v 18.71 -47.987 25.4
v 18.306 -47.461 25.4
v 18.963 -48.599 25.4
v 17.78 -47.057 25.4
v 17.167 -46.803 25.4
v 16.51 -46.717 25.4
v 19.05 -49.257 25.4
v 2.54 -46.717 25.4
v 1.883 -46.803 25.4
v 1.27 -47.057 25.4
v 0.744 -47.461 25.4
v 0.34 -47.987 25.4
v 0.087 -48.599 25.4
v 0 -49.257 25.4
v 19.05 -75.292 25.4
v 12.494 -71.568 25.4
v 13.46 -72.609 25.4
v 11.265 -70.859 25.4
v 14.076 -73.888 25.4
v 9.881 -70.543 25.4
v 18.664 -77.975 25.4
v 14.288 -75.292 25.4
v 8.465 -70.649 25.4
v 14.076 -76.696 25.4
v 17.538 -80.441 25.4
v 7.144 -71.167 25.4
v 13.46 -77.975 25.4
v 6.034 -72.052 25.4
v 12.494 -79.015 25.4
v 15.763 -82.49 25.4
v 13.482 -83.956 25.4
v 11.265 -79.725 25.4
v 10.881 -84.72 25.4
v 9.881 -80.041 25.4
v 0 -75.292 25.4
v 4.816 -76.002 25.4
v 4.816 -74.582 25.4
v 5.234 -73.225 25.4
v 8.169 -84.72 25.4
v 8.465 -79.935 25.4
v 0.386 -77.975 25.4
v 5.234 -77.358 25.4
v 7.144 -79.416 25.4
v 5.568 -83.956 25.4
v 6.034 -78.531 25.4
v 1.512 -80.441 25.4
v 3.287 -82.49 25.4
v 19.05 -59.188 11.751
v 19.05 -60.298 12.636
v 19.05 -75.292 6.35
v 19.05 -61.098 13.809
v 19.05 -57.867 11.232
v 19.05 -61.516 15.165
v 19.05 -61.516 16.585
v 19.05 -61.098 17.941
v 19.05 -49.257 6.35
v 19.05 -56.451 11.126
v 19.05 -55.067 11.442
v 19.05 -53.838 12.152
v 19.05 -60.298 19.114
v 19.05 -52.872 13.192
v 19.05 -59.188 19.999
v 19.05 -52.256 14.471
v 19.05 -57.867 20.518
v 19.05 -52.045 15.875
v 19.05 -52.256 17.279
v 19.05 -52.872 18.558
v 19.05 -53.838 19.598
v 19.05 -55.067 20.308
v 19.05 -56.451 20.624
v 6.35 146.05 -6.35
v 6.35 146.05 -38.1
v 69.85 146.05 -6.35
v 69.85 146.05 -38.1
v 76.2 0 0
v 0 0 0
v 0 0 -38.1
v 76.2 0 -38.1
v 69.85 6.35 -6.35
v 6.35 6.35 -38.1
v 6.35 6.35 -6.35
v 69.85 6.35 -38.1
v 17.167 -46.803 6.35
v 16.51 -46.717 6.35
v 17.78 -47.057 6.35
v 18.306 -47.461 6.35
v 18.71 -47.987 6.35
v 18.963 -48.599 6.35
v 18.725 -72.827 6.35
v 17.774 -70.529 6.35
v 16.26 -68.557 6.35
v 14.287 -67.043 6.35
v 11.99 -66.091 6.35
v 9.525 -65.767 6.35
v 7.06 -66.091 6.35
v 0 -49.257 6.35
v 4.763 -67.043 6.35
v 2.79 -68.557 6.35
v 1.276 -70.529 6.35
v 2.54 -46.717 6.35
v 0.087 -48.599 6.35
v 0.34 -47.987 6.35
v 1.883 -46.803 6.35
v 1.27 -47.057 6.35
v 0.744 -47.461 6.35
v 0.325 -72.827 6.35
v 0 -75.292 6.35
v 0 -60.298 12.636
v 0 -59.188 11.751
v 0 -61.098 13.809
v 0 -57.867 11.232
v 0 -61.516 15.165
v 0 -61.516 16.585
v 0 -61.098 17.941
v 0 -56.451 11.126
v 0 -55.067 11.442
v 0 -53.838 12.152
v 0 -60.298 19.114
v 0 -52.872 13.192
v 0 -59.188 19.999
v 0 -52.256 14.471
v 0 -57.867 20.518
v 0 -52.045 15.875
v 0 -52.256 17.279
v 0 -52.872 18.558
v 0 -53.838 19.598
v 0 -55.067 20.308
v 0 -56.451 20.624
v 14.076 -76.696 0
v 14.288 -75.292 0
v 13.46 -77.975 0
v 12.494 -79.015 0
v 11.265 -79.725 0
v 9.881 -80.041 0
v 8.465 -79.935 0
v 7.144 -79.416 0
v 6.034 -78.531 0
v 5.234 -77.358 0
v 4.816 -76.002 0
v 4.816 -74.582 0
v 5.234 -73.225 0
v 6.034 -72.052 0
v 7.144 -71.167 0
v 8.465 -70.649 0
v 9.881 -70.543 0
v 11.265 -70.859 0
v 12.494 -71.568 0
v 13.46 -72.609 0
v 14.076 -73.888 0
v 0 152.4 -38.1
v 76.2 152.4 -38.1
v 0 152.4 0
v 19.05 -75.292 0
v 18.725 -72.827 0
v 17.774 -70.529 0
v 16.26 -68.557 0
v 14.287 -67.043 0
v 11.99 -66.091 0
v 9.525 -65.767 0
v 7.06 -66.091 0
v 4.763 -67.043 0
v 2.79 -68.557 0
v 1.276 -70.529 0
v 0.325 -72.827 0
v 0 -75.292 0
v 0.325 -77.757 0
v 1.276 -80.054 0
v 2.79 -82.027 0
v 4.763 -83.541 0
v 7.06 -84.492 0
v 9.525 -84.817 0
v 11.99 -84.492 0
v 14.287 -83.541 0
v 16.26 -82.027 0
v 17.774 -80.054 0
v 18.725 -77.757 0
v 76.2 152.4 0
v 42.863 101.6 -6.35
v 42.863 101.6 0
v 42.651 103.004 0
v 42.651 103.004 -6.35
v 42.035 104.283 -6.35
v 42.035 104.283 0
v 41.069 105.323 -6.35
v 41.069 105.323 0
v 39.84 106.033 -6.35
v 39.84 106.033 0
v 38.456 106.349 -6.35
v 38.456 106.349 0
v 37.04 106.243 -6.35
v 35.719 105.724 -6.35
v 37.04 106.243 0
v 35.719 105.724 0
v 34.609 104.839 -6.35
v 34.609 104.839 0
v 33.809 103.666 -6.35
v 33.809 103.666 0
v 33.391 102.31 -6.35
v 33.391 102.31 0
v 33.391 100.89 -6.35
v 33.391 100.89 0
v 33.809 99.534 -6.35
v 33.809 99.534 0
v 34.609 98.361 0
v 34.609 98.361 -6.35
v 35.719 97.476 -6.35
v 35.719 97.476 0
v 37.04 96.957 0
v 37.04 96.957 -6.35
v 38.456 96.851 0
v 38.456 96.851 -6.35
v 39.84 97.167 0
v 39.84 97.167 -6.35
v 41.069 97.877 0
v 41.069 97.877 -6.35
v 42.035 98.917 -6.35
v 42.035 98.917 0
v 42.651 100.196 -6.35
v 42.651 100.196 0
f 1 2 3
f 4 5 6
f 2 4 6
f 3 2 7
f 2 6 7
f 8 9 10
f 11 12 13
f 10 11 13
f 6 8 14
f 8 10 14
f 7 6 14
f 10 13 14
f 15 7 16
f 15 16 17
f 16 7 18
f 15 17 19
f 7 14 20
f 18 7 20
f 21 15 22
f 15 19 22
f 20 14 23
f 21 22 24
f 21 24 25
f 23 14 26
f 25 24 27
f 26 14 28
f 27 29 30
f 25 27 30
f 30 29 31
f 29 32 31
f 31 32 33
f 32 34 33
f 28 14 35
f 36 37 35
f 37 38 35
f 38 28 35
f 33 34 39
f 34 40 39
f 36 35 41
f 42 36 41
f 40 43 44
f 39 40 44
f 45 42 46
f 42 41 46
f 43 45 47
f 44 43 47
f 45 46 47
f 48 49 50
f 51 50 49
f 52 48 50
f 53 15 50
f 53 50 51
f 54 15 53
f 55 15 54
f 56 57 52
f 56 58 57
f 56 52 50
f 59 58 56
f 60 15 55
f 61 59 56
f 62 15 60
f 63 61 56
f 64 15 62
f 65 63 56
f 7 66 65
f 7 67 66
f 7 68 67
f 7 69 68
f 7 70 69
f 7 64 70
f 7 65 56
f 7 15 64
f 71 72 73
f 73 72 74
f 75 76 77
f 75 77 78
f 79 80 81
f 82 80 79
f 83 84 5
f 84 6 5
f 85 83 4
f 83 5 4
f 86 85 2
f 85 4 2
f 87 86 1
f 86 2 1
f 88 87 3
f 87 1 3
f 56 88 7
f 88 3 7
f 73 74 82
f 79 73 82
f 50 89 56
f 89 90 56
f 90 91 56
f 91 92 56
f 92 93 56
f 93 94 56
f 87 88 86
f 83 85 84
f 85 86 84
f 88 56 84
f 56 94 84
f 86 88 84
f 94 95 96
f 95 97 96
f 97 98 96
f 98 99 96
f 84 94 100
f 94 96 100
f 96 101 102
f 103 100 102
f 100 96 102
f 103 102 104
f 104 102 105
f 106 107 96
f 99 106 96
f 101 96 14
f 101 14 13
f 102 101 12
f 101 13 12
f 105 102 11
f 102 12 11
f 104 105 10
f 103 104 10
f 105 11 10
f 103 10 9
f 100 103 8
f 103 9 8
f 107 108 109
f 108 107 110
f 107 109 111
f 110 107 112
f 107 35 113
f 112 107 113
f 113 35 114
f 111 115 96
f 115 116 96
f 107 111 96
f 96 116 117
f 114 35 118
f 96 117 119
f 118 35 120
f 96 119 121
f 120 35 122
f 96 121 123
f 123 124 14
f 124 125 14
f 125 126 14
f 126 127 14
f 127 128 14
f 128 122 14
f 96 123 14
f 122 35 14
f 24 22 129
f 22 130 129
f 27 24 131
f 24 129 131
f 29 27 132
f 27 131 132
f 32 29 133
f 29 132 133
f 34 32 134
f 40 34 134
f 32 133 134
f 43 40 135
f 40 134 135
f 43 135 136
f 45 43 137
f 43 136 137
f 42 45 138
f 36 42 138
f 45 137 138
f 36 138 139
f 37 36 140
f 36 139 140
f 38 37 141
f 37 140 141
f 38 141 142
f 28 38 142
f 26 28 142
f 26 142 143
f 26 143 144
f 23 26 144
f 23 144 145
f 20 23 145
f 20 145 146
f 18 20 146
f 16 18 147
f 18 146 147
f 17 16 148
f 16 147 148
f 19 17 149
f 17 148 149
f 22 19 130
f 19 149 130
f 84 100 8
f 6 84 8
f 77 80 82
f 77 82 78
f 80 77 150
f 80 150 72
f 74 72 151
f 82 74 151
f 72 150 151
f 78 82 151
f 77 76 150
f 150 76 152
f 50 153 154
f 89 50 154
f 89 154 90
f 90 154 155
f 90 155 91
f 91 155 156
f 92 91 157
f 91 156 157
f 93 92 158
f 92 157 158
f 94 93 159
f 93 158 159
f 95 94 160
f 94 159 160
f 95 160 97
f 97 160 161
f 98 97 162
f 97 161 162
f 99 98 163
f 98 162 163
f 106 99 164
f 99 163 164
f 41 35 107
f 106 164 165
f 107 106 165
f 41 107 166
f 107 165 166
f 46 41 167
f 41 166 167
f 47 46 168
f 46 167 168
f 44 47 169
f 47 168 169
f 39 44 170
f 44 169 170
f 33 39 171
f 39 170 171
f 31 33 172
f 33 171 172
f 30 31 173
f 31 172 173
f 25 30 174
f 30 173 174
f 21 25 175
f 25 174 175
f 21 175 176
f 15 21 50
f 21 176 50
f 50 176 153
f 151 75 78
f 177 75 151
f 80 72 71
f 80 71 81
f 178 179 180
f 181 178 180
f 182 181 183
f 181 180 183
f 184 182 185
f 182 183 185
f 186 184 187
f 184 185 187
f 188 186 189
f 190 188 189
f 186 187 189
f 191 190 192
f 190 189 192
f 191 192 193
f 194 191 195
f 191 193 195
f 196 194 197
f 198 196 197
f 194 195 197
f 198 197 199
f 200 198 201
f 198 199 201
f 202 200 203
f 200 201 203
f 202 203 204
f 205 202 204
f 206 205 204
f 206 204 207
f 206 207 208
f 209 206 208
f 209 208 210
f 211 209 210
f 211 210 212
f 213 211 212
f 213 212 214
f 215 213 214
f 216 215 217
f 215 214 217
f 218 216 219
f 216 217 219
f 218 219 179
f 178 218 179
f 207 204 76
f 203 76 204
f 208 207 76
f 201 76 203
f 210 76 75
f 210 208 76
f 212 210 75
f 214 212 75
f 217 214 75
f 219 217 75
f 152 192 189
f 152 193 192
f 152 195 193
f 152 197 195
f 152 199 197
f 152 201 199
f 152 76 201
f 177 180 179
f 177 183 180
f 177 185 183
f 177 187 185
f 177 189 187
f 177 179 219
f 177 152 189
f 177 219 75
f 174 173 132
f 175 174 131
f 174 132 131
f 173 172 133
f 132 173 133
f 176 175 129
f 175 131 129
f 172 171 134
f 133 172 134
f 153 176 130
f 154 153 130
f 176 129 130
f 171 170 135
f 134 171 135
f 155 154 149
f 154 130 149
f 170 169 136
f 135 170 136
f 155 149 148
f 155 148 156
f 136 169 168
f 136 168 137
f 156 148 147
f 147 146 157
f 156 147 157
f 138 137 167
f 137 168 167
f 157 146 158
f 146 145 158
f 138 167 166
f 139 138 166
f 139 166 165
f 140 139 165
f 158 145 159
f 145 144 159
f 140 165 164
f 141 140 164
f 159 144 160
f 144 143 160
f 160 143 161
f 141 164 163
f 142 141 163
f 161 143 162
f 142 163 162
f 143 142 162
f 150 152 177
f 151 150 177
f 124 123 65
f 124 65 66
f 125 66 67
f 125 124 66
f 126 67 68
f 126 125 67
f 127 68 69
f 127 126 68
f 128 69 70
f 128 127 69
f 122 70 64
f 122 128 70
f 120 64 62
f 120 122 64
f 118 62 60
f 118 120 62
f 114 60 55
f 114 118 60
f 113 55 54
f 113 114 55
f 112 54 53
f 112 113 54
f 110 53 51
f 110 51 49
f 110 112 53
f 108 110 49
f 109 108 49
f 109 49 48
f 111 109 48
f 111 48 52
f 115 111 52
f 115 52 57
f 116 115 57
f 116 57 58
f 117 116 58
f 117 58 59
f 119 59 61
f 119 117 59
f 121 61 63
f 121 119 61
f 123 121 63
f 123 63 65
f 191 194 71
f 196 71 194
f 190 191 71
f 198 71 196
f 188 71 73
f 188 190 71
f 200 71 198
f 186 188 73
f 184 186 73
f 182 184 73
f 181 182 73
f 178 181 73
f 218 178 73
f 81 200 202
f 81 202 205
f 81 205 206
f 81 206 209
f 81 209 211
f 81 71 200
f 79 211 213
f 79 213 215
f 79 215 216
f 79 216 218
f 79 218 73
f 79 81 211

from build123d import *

# Parameters (mm, degrees)
F0_W      = 76.2
F0_H      = 152.4
F1_DEPTH  = 38.1
F3_W      = 63.5
F3_H      = 139.7
F4_DEPTH  = 31.75
F2_R      = 4.7625
F5_DEPTH  = 6.35
F6_R      = 4.7625
F7_DEPTH  = 19.05
F8_R      = 4.7625
F9_DEPTH  = 25.4
F10_R     = 4.7625
F11_DEPTH = 6.35
F13_DEPTH = 25.4
F14_R     = 2.54


with BuildPart() as f1:
    # F0 (on Top) → F1 (new body)
    with BuildSketch(Plane.XY):
        with Locations((38.1, 76.2)):
            Rectangle(F0_W, F0_H)
    extrude(amount=-F1_DEPTH)

    # F3 (on face) → F4 (cut)
    with BuildSketch(Plane(origin=(0, 0, -38.1), x_dir=(1, 0, 0), z_dir=(0, 0, -1))):
        with Locations((38.1, -76.2)):
            Rectangle(F3_W, F3_H)
    extrude(amount=-F4_DEPTH, mode=Mode.SUBTRACT)

    # F2 (on face) → F5 (cut)
    with BuildSketch(Plane.XY):
        with Locations((38.1, 101.6)):
            Circle(F2_R)
    extrude(amount=-F5_DEPTH, mode=Mode.SUBTRACT)


with BuildPart() as f7:
    # F6 (on Right) → F7 (new body)
    with BuildSketch(Plane.YZ):
        Polygon((-84.816796507, 25.4), (-84.816796507, 0), (-65.766796507, 0), (-65.766796507, 6.35), (-46.716796507, 6.35), (-46.716796507, 25.4), align=None)
        with Locations((-56.8071752787, 15.875)):
            Circle(F6_R, mode=Mode.SUBTRACT)
    extrude(amount=F7_DEPTH)

    # F8 (on face) → F9 (cut)
    with BuildSketch(Plane(origin=(0, 0, 0), x_dir=(1, 0, 0), z_dir=(0, 0, -1))):
        with Locations((9.525, 75.291796507)):
            Circle(F8_R)
    extrude(amount=-F9_DEPTH, mode=Mode.SUBTRACT)

    # F10 (on face) → F11 (cut)
    with BuildSketch(Plane(origin=(0, 0, 0), x_dir=(1, 0, 0), z_dir=(0, 0, -1))):
        with BuildLine():
            ThreePointArc((0, 75.291796507), (2.7898079092, 82.0269885978), (9.525, 84.816796507))
            Line((9.525, 84.816796507), (0, 84.816796507))
            Line((0, 84.816796507), (0, 75.291796507))
        make_face()
        with BuildLine():
            Line((0, 65.766796507), (9.525, 65.766796507))
            ThreePointArc((9.525, 65.766796507), (2.7898079092, 68.5566044162), (0, 75.291796507))
            Line((0, 75.291796507), (0, 65.766796507))
        make_face()
        with BuildLine():
            Line((19.05, 65.766796507), (19.05, 75.291796507))
            ThreePointArc((19.05, 75.291796507), (16.2601920908, 68.5566044162), (9.525, 65.766796507))
            Line((9.525, 65.766796507), (19.05, 65.766796507))
        make_face()
        with Locations((9.525, 75.291796507)):
            Circle(F10_R)
        with BuildLine():
            ThreePointArc((9.525, 84.816796507), (16.2601920908, 82.0269885978), (19.05, 75.291796507))
            Line((19.05, 75.291796507), (19.05, 84.816796507))
            Line((19.05, 84.816796507), (9.525, 84.816796507))
        make_face()
    extrude(amount=-F11_DEPTH, mode=Mode.SUBTRACT)

    # F12 (on face) → F13 (cut)
    with BuildSketch(Plane(origin=(0, 0, 0), x_dir=(1, 0, 0), z_dir=(0, 0, -1))):
        with BuildLine():
            ThreePointArc((0, 75.291796507), (9.525, 84.816796507), (19.05, 75.291796507))
            Line((19.05, 75.291796507), (19.05, 86.4143148065))
            Line((19.05, 86.4143148065), (-0.9318563389, 86.4143148065))
            Line((-0.9318563389, 86.4143148065), (-0.9318563389, 75.291796507))
            Line((-0.9318563389, 75.291796507), (0, 75.291796507))
        make_face()
    extrude(amount=-F13_DEPTH, mode=Mode.SUBTRACT)

    # F14
    f14_edges = [f7.edges().sort_by_distance(p)[0] for p in [
        (19.05, -46.716797, 15.875),
        (0, -46.716797, 15.875),
    ]]
    fillet(f14_edges, radius=F14_R)


solid = Compound([f1.part, f7.part])
